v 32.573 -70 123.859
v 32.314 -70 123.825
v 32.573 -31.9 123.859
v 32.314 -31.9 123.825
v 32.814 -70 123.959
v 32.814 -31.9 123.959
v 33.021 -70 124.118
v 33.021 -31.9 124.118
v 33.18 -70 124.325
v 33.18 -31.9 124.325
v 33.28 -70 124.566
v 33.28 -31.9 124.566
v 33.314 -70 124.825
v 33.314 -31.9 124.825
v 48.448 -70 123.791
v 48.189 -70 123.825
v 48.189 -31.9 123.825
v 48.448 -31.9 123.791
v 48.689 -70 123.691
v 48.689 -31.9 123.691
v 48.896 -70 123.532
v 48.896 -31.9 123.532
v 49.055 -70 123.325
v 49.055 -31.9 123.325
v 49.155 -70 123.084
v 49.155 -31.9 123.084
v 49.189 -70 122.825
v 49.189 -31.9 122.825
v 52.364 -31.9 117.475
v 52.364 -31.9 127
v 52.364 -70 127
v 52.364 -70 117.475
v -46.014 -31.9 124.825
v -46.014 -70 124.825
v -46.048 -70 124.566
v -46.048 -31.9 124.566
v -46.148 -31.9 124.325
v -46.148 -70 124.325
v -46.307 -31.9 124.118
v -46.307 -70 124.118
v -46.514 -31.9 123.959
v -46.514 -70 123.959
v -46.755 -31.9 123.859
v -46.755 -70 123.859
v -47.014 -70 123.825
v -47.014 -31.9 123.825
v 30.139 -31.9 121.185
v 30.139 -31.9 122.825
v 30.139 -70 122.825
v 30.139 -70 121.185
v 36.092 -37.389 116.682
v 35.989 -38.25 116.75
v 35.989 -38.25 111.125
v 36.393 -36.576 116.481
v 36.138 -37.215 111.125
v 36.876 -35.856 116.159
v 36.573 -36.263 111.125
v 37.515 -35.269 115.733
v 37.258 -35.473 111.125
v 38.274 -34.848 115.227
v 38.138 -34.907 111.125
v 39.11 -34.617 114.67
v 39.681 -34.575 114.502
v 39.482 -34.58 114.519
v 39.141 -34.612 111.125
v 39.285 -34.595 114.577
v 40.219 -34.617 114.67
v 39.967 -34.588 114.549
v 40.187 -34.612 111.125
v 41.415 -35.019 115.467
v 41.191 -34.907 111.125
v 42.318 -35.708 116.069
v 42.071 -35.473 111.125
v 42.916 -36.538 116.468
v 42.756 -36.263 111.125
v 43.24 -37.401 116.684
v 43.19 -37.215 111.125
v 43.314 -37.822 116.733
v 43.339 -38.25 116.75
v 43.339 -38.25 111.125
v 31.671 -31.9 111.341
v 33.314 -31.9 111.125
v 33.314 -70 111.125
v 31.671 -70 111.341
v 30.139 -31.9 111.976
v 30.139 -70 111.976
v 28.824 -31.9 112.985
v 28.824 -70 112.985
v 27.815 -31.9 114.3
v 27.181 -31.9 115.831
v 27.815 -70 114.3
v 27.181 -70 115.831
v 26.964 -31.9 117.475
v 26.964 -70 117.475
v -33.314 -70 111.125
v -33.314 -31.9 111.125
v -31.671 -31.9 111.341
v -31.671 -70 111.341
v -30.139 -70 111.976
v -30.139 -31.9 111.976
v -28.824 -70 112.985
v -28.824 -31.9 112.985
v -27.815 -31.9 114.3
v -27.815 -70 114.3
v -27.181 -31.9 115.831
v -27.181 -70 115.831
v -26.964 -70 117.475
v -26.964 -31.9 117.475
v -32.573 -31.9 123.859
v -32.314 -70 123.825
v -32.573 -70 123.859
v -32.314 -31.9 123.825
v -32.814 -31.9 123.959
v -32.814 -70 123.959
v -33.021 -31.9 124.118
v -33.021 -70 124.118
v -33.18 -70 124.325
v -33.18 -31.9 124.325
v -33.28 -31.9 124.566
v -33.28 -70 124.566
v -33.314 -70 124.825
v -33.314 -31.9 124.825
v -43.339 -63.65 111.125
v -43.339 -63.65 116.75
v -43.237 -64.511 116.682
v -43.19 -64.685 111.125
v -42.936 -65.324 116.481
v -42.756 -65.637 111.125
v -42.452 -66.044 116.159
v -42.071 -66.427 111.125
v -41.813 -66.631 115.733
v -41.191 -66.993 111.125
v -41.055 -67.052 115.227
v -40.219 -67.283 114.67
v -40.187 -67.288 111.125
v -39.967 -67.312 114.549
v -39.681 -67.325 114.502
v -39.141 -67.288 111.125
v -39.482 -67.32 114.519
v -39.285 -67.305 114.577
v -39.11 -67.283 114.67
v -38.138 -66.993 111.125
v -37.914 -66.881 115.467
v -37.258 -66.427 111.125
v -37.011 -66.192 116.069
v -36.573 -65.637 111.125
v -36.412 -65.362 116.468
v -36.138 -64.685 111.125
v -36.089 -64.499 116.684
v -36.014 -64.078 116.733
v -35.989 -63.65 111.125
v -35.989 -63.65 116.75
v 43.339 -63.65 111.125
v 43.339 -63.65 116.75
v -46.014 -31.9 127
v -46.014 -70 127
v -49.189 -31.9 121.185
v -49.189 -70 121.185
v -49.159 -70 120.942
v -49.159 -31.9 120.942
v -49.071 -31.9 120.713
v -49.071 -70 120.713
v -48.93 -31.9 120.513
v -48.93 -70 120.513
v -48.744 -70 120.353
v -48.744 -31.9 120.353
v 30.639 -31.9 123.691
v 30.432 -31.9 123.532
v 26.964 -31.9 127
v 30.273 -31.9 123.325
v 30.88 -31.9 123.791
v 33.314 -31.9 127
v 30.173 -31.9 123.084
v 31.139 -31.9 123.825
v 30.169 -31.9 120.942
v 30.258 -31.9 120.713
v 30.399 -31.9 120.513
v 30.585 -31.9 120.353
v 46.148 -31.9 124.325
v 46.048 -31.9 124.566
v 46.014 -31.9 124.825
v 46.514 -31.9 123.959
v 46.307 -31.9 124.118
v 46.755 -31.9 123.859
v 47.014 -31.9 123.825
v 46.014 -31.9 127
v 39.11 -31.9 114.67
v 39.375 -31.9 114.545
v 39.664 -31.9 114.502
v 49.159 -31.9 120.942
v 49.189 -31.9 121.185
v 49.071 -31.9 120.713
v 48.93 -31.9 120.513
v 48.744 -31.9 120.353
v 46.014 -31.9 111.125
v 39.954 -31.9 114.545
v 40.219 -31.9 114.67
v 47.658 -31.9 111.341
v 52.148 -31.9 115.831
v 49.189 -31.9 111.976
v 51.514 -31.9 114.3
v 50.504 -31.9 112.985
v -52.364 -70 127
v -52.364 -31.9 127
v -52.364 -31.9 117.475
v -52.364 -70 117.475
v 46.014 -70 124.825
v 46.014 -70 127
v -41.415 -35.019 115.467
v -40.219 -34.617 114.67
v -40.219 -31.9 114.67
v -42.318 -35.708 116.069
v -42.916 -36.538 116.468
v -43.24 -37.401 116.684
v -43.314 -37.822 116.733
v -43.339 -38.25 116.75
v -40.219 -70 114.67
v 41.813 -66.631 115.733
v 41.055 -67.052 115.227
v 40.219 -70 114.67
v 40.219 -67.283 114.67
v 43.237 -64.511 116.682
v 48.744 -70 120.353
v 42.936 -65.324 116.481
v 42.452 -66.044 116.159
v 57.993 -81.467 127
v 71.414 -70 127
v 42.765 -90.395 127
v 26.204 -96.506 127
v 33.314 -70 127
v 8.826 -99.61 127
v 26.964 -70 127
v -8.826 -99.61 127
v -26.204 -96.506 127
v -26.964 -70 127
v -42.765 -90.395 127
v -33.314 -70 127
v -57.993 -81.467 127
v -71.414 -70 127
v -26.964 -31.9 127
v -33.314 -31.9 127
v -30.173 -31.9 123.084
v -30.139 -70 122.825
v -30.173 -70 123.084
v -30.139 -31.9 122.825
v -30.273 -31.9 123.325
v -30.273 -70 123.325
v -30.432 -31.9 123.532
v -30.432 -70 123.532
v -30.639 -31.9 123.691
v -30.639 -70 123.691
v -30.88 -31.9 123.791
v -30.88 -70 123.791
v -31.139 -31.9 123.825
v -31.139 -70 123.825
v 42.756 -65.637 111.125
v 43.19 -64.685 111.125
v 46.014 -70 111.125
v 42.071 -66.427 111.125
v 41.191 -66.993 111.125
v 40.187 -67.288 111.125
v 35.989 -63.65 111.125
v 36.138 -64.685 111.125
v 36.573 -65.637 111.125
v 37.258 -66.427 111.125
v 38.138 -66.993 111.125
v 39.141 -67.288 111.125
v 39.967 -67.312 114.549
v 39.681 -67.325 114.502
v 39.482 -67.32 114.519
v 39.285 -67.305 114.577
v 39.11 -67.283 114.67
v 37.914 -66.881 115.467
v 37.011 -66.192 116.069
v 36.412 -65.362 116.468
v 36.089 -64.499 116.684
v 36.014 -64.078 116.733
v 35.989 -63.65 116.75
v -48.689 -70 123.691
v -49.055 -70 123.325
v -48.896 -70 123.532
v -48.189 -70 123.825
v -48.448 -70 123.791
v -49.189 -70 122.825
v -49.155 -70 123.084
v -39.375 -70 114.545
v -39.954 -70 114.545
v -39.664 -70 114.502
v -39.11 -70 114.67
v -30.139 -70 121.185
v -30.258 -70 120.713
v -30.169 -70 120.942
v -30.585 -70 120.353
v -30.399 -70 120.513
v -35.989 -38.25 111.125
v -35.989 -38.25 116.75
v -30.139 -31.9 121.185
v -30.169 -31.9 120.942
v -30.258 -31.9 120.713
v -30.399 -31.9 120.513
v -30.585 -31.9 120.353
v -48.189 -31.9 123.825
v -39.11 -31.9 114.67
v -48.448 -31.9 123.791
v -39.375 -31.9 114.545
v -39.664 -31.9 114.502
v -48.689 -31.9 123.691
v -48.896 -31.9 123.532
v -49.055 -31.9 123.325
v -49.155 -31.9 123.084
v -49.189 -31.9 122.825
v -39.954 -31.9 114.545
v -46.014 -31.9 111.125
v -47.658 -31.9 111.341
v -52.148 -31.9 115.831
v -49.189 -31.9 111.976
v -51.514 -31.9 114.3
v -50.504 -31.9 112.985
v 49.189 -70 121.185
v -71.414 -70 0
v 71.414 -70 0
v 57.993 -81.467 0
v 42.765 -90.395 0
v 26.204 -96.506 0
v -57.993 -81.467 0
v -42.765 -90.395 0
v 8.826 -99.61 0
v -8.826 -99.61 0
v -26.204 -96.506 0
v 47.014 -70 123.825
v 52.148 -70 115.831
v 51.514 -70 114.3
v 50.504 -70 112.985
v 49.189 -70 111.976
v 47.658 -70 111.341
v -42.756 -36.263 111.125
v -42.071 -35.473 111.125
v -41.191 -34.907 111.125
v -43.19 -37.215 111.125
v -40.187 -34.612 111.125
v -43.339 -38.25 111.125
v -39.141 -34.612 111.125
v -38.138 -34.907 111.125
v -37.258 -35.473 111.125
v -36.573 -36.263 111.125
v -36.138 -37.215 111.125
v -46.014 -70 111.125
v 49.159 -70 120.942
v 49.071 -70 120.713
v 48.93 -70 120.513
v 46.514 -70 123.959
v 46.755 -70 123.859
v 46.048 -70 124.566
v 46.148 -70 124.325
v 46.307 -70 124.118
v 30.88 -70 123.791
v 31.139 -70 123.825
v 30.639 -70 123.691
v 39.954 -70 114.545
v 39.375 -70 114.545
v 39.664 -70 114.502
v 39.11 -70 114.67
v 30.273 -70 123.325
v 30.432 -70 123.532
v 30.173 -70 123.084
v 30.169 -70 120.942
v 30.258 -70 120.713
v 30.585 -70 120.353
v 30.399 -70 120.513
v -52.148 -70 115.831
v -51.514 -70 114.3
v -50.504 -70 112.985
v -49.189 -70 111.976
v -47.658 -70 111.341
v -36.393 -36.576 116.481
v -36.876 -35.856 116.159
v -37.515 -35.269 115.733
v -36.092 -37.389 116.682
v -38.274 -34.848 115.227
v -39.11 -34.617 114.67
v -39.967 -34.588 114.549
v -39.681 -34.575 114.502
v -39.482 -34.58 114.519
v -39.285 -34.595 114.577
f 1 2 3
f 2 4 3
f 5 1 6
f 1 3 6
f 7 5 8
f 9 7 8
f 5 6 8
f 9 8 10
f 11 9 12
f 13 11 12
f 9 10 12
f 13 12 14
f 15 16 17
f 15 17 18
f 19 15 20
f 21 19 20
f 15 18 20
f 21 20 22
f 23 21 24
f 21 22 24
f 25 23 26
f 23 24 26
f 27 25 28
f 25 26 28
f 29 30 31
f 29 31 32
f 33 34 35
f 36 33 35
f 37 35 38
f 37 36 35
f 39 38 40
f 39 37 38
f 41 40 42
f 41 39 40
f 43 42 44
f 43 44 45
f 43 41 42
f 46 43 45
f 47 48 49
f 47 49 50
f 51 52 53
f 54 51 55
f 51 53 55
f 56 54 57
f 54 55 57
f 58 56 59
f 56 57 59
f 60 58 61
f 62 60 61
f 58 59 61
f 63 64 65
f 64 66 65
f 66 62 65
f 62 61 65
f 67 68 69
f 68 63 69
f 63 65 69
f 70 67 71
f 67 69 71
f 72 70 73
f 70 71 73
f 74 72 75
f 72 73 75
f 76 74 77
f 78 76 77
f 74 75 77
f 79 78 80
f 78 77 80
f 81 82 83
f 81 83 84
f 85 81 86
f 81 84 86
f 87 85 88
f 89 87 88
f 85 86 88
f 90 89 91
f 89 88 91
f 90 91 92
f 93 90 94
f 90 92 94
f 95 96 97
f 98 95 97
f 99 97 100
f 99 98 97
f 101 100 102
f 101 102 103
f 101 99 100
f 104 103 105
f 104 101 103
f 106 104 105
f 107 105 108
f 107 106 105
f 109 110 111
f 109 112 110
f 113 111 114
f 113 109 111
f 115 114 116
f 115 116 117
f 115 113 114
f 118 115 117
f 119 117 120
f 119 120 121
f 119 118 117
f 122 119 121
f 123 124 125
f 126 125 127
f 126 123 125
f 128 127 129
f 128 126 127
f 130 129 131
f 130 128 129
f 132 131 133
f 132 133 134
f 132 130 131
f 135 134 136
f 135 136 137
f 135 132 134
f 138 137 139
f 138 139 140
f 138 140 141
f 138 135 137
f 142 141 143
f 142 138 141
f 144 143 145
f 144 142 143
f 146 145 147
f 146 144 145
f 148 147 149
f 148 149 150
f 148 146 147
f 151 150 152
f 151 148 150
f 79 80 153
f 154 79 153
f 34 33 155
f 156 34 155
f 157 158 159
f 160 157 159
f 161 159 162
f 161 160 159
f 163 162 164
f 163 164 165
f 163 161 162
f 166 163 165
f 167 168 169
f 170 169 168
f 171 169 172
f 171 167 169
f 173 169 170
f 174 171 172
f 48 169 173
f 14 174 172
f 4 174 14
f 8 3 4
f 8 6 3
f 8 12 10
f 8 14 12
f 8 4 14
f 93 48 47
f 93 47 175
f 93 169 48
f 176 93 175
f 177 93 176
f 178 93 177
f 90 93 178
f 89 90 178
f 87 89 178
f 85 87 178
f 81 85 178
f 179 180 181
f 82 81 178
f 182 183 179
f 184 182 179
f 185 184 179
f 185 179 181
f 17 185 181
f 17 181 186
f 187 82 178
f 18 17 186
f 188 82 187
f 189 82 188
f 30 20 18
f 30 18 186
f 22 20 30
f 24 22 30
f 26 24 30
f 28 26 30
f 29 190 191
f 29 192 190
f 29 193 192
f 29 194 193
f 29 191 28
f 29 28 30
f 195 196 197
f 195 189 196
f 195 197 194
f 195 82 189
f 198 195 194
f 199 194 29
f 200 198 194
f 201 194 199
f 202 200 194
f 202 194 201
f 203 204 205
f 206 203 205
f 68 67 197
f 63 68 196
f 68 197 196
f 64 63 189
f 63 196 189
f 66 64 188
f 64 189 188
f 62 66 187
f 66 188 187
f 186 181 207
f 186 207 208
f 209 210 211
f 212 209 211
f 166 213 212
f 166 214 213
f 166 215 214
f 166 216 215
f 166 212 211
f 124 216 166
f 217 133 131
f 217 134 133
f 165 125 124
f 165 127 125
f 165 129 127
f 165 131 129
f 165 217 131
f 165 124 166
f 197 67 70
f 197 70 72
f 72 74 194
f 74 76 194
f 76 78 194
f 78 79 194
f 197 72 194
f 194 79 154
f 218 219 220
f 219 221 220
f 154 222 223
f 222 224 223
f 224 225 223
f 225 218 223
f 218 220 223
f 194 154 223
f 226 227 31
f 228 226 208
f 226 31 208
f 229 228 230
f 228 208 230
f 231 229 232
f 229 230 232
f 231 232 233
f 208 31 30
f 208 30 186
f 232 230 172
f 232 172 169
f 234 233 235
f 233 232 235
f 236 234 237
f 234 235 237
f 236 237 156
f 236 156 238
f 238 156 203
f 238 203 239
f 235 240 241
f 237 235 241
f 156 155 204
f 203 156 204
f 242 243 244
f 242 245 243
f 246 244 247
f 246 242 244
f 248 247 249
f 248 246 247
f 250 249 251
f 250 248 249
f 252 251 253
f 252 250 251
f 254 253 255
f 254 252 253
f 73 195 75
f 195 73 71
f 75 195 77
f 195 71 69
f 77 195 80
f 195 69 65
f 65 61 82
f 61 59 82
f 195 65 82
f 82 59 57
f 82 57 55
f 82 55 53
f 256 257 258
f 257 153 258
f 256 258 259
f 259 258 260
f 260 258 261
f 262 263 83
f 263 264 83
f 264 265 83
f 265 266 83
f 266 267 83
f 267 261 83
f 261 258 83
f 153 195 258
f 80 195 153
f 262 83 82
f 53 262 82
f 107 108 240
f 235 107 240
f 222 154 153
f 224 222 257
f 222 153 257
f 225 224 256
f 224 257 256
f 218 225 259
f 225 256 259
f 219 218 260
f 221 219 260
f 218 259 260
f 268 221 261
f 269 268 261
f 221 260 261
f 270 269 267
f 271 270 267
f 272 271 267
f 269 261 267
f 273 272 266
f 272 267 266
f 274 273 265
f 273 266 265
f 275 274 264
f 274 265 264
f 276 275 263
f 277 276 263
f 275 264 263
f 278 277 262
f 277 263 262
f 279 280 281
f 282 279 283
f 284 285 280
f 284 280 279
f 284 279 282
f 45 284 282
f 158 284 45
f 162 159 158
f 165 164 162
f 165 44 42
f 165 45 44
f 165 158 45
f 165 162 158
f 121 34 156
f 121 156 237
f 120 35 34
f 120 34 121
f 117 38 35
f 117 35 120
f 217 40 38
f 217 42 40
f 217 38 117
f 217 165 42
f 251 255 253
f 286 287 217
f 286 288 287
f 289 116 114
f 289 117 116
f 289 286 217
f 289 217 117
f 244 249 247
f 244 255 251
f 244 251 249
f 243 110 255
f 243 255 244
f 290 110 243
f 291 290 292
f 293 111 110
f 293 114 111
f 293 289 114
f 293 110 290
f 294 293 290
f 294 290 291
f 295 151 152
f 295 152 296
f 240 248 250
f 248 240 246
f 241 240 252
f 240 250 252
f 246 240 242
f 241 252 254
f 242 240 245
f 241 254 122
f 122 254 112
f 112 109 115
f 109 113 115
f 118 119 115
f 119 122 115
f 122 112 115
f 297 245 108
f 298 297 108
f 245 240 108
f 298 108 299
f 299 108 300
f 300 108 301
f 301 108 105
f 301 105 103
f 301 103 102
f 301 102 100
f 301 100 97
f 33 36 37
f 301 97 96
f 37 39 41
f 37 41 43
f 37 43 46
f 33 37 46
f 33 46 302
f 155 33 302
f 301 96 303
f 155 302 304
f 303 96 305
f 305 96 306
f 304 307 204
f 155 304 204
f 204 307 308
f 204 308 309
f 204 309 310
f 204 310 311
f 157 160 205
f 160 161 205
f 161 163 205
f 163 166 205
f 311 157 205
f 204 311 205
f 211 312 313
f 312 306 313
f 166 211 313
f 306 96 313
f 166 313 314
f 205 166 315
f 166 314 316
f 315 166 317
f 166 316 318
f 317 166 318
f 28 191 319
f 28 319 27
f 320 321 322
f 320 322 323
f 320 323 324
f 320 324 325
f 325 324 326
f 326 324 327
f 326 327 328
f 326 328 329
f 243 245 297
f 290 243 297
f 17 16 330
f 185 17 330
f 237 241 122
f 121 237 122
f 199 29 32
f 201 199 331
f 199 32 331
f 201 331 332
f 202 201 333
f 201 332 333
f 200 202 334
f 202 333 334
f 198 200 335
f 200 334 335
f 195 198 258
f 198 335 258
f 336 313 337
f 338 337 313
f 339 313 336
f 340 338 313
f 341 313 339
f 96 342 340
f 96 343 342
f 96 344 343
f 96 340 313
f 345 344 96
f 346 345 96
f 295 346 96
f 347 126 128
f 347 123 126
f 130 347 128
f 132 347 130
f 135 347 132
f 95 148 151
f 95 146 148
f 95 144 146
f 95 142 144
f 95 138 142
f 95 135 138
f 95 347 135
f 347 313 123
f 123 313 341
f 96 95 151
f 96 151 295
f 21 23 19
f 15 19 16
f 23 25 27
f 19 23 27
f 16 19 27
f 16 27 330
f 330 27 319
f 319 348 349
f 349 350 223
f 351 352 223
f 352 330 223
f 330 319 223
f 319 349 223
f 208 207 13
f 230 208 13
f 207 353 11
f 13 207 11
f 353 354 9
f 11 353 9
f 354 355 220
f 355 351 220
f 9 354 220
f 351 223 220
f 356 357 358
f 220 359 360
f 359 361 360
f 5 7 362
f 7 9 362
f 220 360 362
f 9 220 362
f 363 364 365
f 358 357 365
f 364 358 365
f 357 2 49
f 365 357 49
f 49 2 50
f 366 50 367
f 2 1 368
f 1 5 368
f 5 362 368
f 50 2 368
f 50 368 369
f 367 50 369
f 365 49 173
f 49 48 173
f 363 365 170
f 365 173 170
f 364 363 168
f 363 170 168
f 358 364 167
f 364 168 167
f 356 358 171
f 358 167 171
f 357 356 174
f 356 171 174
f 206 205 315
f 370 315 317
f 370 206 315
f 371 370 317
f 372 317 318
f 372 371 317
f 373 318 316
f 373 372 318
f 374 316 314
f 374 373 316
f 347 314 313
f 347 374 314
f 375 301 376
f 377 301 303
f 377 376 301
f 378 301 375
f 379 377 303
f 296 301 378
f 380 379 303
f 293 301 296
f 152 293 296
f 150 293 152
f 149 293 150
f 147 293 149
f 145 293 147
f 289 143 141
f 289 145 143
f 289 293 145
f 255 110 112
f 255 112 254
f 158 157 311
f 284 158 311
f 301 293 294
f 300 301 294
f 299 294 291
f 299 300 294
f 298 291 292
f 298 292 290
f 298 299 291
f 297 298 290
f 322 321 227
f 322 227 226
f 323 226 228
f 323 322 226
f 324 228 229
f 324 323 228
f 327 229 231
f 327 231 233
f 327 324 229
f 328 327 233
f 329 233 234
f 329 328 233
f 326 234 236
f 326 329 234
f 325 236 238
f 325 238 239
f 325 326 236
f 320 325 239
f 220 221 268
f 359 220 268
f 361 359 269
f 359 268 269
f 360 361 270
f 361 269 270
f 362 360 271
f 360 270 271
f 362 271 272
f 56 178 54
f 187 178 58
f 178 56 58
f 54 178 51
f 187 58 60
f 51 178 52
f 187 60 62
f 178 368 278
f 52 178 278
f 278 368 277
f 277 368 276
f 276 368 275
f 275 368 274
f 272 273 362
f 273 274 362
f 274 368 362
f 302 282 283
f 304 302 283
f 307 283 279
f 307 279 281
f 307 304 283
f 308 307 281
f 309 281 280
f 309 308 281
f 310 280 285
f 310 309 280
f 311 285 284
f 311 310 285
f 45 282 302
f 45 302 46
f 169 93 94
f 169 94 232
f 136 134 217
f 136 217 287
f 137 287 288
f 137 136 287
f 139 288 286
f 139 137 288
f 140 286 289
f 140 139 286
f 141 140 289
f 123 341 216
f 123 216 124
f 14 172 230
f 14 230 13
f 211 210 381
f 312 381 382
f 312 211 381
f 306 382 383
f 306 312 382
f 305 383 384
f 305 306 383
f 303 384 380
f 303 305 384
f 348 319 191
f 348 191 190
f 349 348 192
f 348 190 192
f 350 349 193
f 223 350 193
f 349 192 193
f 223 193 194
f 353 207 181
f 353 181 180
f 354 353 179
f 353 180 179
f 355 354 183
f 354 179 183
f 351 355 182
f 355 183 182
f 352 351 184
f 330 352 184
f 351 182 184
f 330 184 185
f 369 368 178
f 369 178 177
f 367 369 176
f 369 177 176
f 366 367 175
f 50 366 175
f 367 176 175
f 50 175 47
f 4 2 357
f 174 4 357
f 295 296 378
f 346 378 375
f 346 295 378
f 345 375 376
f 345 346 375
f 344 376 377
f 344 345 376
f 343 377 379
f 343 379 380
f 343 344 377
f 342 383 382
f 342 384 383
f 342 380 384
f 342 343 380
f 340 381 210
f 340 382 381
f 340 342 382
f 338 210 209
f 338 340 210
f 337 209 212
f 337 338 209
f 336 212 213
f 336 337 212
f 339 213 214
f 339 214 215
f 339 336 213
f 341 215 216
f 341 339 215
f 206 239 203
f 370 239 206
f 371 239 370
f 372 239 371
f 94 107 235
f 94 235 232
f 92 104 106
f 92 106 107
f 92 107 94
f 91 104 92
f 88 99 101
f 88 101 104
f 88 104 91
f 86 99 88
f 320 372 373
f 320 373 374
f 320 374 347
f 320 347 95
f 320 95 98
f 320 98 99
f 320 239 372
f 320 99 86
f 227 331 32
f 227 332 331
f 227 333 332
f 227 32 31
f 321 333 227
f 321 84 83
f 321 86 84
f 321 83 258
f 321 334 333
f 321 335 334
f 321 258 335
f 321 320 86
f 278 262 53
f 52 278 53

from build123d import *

# Parameters (mm, degrees)
BOSS_EXTRUDE1_DEPTH = 127
BOSS_EXTRUDE2_DEPTH = 38.1
FILLET1_R           = 1
CUT_EXTRUDE1_DEPTH  = 166.676690047


# Read off the part's stored shape, not the designer's step: Mirror1
with BuildPart() as part:
    # Sketch2 → Boss-Extrude1 (new body)
    with BuildSketch(Plane.XY):
        with BuildLine():
            Line((-71.414284285, -70), (71.414284285, -70))
            ThreePointArc((71.414284285, -70), (0, -100), (-71.414284285, -70))
        make_face()
    extrude(amount=BOSS_EXTRUDE1_DEPTH)

    # Sketch3 → Boss-Extrude2 (add)
    with BuildSketch(Plane(origin=(0, -70, 0), x_dir=(1, 0, 0), z_dir=(0, 1, 0))):
        with BuildLine():
            Line((-52.364284285, -127), (-52.364284285, -117.475))
            ThreePointArc((-52.364284285, -117.475), (-50.504412346, -112.984871939), (-46.014284285, -111.125))
            Line((-46.014284285, -111.125), (-33.314284285, -111.125))
            ThreePointArc((-33.314284285, -111.125), (-28.824156225, -112.984871939), (-26.964284285, -117.475))
            Line((-26.964284285, -117.475), (-26.964284285, -127))
            Line((-26.964284285, -127), (-33.314284285, -127))
            Line((-33.314284285, -127), (-33.314284285, -123.825))
            Line((-33.314284285, -123.825), (-30.139284285, -123.825))
            Line((-30.139284285, -123.825), (-30.139284285, -120.65))
            Line((-30.139284285, -120.65), (-39.664284285, -114.3))
            Line((-39.664284285, -114.3), (-49.189284285, -120.65))
            Line((-49.189284285, -120.65), (-49.189284285, -123.825))
            Line((-49.189284285, -123.825), (-46.014284285, -123.825))
            Line((-46.014284285, -123.825), (-46.014284285, -127))
            Line((-46.014284285, -127), (-52.364284285, -127))
        make_face()
    extrude(amount=BOSS_EXTRUDE2_DEPTH)

    # Fillet1
    fillet1_edges = [part.edges().sort_by_distance(p)[0] for p in [
        (-46.014284285, -50.95, 123.825),
        (-49.189284285, -50.95, 123.825),
        (-49.189284285, -50.95, 120.65),
        (-39.664284285, -50.95, 114.3),
        (-30.139284285, -50.95, 120.65),
        (-30.139284285, -50.95, 123.825),
        (-33.314284285, -50.95, 123.825),
    ]]
    fillet(fillet1_edges, radius=FILLET1_R)

    # Sketch5 → Cut-Extrude1 (cut, symmetric)
    with BuildSketch(Plane(origin=(0, 0, 111.125), x_dir=(-1, 0, 0), z_dir=(0, 0, -1))):
        with BuildLine():
            Line((43.339284285, -38.25), (43.339284285, -63.65))
            ThreePointArc((43.339284285, -63.65), (39.664284285, -67.325), (35.989284285, -63.65))
            Line((35.989284285, -63.65), (35.989284285, -38.25))
            ThreePointArc((35.989284285, -38.25), (39.664284285, -34.575), (43.339284285, -38.25))
        make_face()
    extrude(amount=CUT_EXTRUDE1_DEPTH, both=True, mode=Mode.SUBTRACT)

    # Mirror1: part across plane


with BuildPart() as part_1:
    add(part.part)
    add(part.part.mirror(Plane(origin=(0, 0, 0), x_dir=(0, 0, 1), z_dir=(1, 0, 0))))


solid = part_1.part
